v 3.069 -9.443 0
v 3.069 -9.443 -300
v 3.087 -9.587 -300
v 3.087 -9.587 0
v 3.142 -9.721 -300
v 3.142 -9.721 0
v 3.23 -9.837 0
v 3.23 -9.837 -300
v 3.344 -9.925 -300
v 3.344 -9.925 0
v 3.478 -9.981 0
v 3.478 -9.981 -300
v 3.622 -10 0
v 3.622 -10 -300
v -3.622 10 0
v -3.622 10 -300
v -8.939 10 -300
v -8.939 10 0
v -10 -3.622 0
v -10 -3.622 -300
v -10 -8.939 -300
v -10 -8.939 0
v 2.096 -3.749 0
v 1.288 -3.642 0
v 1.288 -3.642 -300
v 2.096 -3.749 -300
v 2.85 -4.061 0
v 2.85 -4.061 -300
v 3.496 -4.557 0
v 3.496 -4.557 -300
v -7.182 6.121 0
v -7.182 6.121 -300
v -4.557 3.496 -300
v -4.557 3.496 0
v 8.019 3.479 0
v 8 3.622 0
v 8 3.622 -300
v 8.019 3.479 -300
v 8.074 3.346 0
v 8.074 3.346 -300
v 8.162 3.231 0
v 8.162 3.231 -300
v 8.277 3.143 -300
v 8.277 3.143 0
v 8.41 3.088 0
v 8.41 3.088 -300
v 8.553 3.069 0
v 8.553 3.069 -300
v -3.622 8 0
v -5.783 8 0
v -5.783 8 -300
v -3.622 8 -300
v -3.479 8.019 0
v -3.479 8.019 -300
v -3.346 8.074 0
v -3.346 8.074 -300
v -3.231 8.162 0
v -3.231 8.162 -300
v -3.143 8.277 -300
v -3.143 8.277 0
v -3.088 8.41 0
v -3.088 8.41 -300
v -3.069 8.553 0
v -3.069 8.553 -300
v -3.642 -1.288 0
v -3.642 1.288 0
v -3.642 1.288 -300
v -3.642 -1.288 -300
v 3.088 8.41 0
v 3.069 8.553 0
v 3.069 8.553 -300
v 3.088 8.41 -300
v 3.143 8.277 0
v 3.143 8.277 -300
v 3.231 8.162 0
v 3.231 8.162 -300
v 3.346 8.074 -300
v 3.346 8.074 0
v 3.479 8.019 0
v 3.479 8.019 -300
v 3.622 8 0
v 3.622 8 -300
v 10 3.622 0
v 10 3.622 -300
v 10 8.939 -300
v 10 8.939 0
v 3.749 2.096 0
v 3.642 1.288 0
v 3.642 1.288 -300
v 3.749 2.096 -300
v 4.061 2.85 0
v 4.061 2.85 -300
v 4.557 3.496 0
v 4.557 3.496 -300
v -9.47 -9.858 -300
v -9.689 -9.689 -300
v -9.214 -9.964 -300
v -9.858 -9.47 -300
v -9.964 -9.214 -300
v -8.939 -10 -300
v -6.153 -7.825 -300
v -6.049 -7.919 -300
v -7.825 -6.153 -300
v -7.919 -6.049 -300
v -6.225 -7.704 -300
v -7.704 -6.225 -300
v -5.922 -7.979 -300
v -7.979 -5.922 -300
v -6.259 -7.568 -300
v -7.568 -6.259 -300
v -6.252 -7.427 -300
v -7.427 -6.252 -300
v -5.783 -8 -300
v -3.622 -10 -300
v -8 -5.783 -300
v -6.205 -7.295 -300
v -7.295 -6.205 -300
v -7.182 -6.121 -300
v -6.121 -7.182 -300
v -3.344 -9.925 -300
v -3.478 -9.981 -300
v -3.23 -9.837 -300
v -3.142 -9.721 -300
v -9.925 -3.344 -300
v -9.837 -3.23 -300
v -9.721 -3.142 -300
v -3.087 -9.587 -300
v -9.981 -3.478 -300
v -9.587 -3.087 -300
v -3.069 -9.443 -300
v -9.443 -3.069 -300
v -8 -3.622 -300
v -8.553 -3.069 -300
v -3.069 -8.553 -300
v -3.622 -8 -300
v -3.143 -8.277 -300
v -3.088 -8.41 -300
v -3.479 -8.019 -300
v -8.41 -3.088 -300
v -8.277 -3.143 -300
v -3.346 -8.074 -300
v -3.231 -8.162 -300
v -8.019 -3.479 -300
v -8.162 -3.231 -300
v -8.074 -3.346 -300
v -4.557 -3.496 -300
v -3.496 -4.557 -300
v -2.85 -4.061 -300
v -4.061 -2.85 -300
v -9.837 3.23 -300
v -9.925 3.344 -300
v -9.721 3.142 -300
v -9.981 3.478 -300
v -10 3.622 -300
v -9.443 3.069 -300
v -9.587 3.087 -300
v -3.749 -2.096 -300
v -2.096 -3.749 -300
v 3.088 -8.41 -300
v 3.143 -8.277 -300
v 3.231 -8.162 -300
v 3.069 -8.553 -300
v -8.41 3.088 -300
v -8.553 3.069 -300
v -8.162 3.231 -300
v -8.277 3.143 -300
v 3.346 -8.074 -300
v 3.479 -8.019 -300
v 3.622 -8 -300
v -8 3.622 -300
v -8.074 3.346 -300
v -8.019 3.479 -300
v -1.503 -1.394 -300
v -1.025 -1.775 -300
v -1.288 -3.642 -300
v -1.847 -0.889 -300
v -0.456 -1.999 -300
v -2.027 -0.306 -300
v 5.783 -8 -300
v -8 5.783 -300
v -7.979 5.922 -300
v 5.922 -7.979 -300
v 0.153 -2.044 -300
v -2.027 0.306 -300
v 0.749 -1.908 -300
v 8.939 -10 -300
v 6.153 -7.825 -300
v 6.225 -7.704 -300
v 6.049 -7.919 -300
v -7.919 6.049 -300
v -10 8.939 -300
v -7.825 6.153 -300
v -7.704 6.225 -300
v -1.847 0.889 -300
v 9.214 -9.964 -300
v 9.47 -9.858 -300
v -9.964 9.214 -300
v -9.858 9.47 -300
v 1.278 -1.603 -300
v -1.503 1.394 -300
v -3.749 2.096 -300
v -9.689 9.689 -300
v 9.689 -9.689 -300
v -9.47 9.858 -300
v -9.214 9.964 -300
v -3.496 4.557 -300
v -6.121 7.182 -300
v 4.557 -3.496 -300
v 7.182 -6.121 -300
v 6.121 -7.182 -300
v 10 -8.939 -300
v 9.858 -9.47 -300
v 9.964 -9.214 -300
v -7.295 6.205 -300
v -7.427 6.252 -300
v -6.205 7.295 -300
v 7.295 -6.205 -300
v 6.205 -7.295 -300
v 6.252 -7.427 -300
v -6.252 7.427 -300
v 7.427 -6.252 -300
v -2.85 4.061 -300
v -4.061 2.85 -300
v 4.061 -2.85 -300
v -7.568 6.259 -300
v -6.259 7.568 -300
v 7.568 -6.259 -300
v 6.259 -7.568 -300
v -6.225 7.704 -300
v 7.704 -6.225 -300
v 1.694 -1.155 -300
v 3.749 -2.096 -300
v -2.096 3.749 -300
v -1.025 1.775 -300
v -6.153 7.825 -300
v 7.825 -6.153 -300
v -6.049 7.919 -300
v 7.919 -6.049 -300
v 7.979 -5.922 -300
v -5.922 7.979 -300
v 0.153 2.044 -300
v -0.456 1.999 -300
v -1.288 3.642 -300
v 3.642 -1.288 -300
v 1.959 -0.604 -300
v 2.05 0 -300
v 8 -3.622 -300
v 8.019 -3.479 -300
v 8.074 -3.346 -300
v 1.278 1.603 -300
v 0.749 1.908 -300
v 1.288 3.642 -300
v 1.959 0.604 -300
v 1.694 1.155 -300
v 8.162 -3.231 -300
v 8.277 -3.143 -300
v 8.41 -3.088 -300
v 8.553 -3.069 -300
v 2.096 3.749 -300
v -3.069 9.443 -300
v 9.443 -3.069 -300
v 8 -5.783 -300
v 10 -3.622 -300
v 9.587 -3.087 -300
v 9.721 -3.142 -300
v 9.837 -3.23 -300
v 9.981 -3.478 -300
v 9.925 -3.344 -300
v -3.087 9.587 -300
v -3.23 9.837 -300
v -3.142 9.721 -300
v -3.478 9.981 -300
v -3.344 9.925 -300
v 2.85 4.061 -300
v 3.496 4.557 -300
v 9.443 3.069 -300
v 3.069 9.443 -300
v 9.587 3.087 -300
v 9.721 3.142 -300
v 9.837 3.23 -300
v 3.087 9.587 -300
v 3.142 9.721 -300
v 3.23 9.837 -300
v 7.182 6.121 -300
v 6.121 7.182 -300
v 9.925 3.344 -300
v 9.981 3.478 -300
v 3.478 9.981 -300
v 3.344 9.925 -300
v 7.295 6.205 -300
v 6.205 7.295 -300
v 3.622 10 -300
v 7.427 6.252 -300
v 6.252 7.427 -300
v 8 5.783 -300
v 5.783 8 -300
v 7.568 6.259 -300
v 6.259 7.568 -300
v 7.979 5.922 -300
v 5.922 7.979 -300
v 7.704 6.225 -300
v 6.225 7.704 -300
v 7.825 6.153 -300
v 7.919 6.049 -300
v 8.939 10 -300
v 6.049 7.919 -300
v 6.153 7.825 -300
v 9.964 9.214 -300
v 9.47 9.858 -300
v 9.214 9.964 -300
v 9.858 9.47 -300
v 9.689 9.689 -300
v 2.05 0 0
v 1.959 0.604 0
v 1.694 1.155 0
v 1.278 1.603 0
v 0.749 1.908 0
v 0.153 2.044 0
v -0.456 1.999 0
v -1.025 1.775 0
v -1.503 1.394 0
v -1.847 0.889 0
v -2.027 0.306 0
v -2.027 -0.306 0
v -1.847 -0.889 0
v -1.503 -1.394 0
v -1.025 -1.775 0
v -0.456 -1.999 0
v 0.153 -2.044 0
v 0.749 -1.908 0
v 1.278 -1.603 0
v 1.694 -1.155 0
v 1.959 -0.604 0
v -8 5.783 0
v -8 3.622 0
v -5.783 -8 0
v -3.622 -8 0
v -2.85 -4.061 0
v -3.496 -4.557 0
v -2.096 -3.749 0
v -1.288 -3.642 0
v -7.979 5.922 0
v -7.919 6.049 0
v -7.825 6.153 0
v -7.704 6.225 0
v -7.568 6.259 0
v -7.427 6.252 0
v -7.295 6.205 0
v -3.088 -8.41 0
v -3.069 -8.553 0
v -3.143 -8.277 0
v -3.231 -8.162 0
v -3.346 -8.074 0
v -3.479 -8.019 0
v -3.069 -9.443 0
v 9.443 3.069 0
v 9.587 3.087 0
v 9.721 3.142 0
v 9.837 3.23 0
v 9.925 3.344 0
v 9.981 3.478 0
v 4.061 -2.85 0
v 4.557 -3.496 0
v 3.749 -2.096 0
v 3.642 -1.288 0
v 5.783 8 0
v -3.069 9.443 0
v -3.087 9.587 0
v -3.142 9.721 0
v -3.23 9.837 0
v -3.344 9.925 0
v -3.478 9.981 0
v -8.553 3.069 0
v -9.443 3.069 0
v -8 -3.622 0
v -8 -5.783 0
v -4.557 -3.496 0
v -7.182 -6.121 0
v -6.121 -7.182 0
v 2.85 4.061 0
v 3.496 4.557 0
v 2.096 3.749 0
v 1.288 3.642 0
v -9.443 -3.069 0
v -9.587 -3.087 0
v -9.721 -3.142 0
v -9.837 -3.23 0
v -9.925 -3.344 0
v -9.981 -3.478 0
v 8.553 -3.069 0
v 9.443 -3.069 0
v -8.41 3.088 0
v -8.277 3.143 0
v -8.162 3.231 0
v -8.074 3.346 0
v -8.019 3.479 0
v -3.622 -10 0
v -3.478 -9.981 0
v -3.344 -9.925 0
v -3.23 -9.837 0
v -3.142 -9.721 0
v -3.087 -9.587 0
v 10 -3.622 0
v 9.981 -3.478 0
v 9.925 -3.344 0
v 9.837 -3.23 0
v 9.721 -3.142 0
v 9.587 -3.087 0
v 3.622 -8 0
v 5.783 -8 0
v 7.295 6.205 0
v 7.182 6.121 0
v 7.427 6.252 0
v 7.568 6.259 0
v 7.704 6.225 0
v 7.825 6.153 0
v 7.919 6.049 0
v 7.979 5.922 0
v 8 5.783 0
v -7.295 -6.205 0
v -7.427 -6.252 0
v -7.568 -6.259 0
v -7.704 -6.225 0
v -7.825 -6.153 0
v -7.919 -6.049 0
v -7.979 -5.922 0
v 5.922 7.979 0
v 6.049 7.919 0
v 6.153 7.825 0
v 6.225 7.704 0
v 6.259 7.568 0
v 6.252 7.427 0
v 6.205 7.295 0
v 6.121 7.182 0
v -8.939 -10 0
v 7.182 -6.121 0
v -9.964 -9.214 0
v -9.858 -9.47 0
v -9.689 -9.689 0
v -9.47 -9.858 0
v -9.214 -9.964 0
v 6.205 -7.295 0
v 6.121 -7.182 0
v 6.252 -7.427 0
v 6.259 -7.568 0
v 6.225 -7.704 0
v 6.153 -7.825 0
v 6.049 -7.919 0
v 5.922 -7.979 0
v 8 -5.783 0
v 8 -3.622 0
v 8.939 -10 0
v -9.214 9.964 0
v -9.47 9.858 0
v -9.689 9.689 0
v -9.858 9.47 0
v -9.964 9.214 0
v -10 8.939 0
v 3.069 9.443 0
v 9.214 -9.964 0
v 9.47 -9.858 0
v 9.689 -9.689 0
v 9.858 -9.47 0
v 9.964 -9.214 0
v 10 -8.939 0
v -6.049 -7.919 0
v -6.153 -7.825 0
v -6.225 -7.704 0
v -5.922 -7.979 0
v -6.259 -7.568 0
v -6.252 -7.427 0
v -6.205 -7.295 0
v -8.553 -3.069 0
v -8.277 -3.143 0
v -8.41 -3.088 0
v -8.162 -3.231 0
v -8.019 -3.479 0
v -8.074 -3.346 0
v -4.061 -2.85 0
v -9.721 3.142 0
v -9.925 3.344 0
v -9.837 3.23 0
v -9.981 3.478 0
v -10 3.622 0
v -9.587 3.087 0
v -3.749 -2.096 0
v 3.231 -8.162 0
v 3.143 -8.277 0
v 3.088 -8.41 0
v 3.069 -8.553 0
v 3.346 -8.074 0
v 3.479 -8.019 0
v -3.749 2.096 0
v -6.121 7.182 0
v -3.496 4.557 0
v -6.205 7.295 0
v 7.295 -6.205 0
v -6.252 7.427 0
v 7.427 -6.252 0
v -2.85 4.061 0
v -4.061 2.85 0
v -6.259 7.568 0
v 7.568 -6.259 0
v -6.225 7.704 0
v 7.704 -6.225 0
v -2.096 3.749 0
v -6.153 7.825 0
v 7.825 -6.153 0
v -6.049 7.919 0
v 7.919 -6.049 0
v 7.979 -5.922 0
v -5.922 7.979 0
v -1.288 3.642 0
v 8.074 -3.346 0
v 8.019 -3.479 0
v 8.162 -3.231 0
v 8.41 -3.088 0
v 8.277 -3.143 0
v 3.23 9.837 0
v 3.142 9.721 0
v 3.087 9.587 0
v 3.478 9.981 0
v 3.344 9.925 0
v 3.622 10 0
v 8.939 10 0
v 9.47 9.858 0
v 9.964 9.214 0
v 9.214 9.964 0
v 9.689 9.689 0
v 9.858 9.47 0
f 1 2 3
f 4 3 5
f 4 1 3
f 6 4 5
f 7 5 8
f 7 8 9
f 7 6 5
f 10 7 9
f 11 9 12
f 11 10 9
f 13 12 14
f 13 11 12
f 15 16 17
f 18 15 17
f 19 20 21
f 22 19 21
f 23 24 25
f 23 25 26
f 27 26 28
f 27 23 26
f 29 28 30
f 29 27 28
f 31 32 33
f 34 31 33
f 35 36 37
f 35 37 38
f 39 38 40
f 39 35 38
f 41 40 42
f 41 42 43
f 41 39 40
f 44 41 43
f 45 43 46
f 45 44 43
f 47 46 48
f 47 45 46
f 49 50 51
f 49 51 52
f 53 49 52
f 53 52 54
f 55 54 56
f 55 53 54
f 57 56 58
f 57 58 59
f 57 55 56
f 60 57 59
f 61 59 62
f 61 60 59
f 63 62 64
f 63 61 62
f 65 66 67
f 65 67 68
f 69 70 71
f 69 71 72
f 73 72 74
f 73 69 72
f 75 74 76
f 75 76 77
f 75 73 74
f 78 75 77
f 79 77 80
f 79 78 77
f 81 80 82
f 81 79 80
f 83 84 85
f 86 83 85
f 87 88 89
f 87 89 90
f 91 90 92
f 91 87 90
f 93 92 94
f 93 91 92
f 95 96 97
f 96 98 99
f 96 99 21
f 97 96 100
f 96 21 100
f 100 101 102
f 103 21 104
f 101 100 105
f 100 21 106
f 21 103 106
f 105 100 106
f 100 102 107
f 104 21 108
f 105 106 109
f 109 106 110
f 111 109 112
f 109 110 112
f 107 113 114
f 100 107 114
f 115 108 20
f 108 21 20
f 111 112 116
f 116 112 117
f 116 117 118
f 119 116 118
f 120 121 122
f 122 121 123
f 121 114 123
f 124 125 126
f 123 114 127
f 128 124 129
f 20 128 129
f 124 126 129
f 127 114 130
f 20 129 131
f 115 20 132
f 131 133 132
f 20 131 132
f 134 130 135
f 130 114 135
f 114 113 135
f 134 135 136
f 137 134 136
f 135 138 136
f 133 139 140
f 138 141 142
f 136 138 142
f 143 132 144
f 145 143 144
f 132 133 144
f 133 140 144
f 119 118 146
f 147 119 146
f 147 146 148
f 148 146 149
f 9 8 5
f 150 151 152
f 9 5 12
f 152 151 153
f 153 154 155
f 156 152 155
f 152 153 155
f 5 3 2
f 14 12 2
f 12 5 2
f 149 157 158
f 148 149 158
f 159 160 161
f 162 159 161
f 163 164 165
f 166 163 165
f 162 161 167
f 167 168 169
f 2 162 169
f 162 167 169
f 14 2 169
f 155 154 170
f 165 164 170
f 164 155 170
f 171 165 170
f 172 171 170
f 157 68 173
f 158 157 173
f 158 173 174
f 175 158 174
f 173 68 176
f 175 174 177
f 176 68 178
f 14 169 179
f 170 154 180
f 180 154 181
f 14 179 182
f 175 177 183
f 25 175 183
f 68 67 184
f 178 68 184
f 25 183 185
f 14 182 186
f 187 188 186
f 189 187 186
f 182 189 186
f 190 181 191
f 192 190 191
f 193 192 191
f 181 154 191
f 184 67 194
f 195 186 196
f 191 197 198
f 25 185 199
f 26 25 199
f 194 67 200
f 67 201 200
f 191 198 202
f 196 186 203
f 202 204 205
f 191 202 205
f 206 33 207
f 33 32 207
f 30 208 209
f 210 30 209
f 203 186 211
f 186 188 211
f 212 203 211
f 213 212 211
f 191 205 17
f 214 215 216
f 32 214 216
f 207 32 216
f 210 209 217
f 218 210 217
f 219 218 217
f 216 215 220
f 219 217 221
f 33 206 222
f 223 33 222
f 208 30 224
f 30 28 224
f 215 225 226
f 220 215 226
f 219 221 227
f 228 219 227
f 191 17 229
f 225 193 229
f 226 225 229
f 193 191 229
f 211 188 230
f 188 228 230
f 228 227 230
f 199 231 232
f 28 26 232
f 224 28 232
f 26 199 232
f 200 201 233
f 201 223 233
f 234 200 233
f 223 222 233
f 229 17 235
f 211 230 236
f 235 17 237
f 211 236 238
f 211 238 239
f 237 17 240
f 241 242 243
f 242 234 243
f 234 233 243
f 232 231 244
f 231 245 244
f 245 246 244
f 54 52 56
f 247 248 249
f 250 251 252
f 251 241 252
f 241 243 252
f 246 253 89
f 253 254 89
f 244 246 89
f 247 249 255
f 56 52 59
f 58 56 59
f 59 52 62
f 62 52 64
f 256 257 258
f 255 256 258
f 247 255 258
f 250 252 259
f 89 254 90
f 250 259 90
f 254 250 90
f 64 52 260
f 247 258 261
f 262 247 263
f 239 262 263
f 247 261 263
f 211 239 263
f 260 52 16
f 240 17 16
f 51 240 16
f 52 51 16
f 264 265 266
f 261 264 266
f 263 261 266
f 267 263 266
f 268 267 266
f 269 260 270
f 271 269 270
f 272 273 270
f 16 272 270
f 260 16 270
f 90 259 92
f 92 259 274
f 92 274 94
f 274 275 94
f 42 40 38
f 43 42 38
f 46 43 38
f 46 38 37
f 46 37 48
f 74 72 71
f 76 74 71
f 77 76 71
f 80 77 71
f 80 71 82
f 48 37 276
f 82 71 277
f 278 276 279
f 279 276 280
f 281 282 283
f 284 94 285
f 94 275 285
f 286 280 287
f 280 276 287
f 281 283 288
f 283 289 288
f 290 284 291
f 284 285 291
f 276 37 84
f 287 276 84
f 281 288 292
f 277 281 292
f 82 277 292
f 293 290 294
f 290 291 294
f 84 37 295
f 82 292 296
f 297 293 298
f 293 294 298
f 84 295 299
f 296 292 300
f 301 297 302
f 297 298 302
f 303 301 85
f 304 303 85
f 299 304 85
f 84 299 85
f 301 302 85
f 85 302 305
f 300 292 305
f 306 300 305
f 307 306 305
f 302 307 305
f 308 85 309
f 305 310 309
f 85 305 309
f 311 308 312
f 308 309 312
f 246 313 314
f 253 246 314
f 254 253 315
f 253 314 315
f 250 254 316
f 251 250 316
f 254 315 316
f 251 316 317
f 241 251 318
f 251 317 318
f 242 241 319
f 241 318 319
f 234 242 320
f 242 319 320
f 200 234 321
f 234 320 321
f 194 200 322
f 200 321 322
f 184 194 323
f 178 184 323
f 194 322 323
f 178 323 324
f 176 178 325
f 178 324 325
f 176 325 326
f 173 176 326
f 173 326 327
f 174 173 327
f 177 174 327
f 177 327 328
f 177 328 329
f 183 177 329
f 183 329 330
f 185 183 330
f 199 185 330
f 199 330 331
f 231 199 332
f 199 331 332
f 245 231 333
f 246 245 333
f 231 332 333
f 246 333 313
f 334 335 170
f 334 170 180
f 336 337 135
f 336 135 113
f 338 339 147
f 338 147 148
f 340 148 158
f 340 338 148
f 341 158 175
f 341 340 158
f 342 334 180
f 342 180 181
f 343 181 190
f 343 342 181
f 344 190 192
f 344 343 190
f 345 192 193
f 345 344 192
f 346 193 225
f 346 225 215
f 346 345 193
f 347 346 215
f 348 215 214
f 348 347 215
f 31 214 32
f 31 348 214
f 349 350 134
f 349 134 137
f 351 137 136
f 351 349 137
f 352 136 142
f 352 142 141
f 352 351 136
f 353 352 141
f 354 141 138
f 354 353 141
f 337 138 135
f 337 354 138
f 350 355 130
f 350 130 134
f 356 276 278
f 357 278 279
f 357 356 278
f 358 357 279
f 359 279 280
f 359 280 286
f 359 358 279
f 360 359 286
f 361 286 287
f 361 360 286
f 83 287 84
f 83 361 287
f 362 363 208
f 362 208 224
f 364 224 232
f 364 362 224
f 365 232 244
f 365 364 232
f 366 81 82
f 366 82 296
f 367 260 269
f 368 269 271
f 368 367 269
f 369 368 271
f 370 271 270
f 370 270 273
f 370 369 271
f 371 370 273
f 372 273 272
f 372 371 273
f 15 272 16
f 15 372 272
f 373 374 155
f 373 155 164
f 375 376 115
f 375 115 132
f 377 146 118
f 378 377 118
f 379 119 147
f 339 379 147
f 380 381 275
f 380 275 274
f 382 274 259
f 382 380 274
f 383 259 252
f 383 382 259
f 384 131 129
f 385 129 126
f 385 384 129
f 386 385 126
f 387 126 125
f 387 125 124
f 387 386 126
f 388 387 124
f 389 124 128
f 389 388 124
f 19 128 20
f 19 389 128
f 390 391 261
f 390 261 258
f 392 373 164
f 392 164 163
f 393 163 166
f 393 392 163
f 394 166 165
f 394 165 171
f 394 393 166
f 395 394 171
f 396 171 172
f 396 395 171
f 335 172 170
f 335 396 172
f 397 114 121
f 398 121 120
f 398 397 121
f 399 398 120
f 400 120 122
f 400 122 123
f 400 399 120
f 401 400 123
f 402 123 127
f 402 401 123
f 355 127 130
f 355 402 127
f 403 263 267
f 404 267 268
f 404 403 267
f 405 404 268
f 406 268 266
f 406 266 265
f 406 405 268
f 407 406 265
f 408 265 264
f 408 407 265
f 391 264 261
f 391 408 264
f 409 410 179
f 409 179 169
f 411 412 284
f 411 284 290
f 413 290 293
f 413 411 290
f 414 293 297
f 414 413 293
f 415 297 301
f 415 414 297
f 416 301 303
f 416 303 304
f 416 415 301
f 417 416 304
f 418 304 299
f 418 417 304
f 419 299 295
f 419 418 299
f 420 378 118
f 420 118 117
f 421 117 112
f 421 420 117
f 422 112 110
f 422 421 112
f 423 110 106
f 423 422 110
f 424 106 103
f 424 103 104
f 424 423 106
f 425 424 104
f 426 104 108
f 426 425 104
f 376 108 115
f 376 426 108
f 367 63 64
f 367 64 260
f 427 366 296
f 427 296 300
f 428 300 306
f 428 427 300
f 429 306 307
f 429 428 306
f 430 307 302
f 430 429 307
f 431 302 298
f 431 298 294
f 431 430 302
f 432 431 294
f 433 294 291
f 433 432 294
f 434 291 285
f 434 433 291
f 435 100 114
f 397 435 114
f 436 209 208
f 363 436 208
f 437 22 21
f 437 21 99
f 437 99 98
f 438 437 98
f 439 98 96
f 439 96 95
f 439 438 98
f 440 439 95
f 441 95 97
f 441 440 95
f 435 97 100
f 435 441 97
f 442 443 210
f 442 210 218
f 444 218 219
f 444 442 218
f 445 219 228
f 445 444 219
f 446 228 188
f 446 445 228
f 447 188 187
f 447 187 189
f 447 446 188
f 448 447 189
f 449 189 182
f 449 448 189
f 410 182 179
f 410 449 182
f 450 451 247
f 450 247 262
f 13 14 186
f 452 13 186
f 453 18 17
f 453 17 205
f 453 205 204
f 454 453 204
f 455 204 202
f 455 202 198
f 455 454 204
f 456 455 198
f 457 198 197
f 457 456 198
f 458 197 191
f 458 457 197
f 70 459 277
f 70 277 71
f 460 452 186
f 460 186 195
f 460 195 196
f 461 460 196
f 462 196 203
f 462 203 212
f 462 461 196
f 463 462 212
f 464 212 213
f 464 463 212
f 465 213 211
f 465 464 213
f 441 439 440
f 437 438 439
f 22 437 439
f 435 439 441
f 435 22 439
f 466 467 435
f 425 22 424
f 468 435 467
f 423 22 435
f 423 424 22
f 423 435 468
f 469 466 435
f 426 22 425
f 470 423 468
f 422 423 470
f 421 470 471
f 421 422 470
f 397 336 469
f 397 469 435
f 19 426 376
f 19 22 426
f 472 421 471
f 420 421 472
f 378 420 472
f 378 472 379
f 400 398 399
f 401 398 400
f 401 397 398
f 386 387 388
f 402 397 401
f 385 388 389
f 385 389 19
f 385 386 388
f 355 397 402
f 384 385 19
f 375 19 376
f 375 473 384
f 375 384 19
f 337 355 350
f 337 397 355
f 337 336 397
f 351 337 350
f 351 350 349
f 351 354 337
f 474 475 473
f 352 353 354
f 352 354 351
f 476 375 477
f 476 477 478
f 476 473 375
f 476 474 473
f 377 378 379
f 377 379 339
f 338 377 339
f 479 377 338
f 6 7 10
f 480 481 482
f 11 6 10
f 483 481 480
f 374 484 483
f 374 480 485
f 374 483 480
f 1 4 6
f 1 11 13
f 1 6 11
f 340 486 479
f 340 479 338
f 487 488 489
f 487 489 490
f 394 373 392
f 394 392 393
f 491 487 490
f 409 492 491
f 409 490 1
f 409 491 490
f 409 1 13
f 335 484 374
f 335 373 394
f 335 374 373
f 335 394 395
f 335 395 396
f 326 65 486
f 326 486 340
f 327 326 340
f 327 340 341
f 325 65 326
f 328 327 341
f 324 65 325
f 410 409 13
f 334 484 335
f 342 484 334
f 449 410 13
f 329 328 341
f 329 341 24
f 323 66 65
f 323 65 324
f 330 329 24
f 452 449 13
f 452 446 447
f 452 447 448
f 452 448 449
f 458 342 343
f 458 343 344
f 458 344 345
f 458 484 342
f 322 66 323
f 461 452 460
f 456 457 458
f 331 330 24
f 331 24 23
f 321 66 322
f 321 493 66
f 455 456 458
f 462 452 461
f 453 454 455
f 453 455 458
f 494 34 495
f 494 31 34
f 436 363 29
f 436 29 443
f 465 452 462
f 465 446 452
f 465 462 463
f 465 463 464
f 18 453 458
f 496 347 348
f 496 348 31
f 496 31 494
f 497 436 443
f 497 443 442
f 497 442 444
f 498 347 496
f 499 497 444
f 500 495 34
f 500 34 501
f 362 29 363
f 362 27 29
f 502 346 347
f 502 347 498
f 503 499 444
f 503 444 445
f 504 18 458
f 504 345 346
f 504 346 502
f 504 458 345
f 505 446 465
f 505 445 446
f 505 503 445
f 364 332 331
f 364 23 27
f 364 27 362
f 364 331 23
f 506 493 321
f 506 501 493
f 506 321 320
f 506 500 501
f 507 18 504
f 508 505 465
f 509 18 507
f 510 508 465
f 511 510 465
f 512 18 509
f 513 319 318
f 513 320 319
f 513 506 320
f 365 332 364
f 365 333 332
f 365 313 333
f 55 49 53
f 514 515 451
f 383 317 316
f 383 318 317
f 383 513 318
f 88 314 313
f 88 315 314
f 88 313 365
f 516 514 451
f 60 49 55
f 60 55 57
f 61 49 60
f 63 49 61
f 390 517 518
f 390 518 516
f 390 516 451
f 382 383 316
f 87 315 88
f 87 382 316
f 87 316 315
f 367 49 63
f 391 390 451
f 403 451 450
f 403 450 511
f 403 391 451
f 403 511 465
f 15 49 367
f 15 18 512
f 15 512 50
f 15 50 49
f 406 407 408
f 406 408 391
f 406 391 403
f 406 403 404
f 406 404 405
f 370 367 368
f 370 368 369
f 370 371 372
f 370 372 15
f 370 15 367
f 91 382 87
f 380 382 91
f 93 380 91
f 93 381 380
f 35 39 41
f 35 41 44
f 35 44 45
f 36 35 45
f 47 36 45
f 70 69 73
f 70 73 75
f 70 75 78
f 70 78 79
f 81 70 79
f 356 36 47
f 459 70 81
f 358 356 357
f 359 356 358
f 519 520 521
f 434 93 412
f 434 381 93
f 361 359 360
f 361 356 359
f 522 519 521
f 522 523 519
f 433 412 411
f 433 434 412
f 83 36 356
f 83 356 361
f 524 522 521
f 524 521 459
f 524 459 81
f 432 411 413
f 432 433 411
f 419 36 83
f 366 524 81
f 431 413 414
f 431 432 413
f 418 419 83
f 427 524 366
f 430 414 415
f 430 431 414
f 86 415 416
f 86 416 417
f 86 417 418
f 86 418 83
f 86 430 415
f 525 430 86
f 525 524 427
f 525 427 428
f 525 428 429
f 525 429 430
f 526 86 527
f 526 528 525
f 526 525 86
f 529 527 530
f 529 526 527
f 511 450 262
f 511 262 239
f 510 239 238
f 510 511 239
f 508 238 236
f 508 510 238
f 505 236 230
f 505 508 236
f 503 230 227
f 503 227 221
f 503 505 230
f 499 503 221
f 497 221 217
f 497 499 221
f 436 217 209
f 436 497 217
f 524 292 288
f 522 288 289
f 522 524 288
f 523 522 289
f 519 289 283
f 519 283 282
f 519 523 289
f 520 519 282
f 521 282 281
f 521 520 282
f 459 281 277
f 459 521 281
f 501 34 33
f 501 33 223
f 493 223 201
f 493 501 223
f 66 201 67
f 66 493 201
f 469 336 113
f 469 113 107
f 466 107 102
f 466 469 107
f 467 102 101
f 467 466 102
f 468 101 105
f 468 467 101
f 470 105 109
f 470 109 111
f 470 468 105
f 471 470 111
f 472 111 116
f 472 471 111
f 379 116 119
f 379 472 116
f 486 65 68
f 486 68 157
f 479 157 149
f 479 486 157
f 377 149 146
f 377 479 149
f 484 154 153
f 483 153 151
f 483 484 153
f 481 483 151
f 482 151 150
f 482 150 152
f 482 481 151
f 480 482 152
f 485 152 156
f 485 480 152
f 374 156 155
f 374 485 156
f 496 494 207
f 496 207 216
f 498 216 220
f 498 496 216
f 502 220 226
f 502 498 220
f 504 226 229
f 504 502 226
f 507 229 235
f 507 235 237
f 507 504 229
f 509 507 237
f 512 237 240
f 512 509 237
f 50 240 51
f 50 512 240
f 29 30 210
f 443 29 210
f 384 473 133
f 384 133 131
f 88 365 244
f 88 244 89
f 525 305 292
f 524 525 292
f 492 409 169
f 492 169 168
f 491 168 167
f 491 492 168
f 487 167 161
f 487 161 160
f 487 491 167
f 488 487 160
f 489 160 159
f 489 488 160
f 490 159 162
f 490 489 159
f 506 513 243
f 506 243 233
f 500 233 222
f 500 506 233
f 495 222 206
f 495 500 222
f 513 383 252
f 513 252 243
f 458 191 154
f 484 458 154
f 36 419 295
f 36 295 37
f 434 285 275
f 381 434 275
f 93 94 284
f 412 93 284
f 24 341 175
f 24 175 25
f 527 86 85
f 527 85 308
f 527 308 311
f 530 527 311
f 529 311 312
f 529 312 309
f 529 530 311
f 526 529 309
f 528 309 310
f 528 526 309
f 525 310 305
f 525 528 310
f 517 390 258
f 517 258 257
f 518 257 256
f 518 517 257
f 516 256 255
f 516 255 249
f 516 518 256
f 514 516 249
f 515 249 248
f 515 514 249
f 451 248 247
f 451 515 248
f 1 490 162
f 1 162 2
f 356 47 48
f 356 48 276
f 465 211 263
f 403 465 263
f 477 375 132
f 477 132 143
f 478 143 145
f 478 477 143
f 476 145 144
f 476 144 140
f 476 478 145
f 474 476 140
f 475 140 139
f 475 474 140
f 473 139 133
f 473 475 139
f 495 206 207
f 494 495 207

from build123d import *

# Parameters (mm, degrees)
SKETCH2_R           = 2.05
BOSS_EXTRUDE1_DEPTH = 300


with BuildPart() as part:
    # Sketch2 → Boss-Extrude1 (new body)
    with BuildSketch(Plane.XY):
        with BuildLine():
            Line((-3.642230561, 1.287773026), (-3.642230561, -1.287773026))
            ThreePointArc((-3.642230561, -1.287773026), (-3.87999308, -2.483085929), (-4.55708345, -3.496423279))
            Line((-4.55708345, -3.496423279), (-7.182004606, -6.121344434))
            ThreePointArc((-7.182004606, -6.121344434), (-7.704200045, -6.225215565), (-8, -5.782519648))
            Line((-8, -5.782519648), (-8, -3.622007668))
            ThreePointArc((-8, -3.622007668), (-8.161974206, -3.230967343), (-8.553014531, -3.068993137))
            Line((-8.553014531, -3.068993137), (-9.443284204, -3.068993137))
            ThreePointArc((-9.443284204, -3.068993137), (-9.836715763, -3.229656566), (-10, -3.622007668))
            Line((-10, -3.622007668), (-10, -8.939033256))
            ThreePointArc((-10, -8.939033256), (-9.689250035, -9.689250035), (-8.939033256, -10))
            Line((-8.939033256, -10), (-3.622007668, -10))
            ThreePointArc((-3.622007668, -10), (-3.229656566, -9.836715763), (-3.068993137, -9.443284204))
            Line((-3.068993137, -9.443284204), (-3.068993137, -8.553014531))
            ThreePointArc((-3.068993137, -8.553014531), (-3.230967343, -8.161974206), (-3.622007668, -8))
            Line((-3.622007668, -8), (-5.782519648, -8))
            ThreePointArc((-5.782519648, -8), (-6.225215565, -7.704200045), (-6.121344434, -7.182004606))
            Line((-6.121344434, -7.182004606), (-3.496423279, -4.55708345))
            ThreePointArc((-3.496423279, -4.55708345), (-2.483085929, -3.87999308), (-1.287773026, -3.642230561))
            Line((-1.287773026, -3.642230561), (1.287773026, -3.642230561))
            ThreePointArc((1.287773026, -3.642230561), (2.483085929, -3.87999308), (3.496423279, -4.55708345))
            Line((3.496423279, -4.55708345), (6.121344434, -7.182004606))
            ThreePointArc((6.121344434, -7.182004606), (6.225215565, -7.704200045), (5.782519648, -8))
            Line((5.782519648, -8), (3.622007668, -8))
            ThreePointArc((3.622007668, -8), (3.230967343, -8.161974206), (3.068993137, -8.553014531))
            Line((3.068993137, -8.553014531), (3.068993137, -9.443284204))
            ThreePointArc((3.068993137, -9.443284204), (3.229656566, -9.836715763), (3.622007668, -10))
            Line((3.622007668, -10), (8.939033256, -10))
            ThreePointArc((8.939033256, -10), (9.689250035, -9.689250035), (10, -8.939033256))
            Line((10, -8.939033256), (10, -3.622007668))
            ThreePointArc((10, -3.622007668), (9.836715763, -3.229656566), (9.443284204, -3.068993137))
            Line((9.443284204, -3.068993137), (8.553014531, -3.068993137))
            ThreePointArc((8.553014531, -3.068993137), (8.161974206, -3.230967343), (8, -3.622007668))
            Line((8, -3.622007668), (8, -5.782519648))
            ThreePointArc((8, -5.782519648), (7.704200045, -6.225215565), (7.182004606, -6.121344434))
            Line((7.182004606, -6.121344434), (4.55708345, -3.496423279))
            ThreePointArc((4.55708345, -3.496423279), (3.87999308, -2.483085929), (3.642230561, -1.287773026))
            Line((3.642230561, -1.287773026), (3.642230561, 1.287773026))
            ThreePointArc((3.642230561, 1.287773026), (3.87999308, 2.483085929), (4.55708345, 3.496423279))
            Line((4.55708345, 3.496423279), (7.182004606, 6.121344434))
            ThreePointArc((7.182004606, 6.121344434), (7.704200045, 6.225215565), (8, 5.782519648))
            Line((8, 5.782519648), (8, 3.622007668))
            ThreePointArc((8, 3.622007668), (8.161974206, 3.230967343), (8.553014531, 3.068993137))
            Line((8.553014531, 3.068993137), (9.443284204, 3.068993137))
            ThreePointArc((9.443284204, 3.068993137), (9.836715763, 3.229656566), (10, 3.622007668))
            Line((10, 3.622007668), (10, 8.939033256))
            ThreePointArc((10, 8.939033256), (9.689250035, 9.689250035), (8.939033256, 10))
            Line((8.939033256, 10), (3.622007668, 10))
            ThreePointArc((3.622007668, 10), (3.229656566, 9.836715763), (3.068993137, 9.443284204))
            Line((3.068993137, 9.443284204), (3.068993137, 8.553014531))
            ThreePointArc((3.068993137, 8.553014531), (3.230967343, 8.161974206), (3.622007668, 8))
            Line((3.622007668, 8), (5.782519648, 8))
            ThreePointArc((5.782519648, 8), (6.225215565, 7.704200045), (6.121344434, 7.182004606))
            Line((6.121344434, 7.182004606), (3.496423279, 4.55708345))
            ThreePointArc((3.496423279, 4.55708345), (2.483085929, 3.87999308), (1.287773026, 3.642230561))
            Line((1.287773026, 3.642230561), (-1.287773026, 3.642230561))
            ThreePointArc((-1.287773026, 3.642230561), (-2.483085929, 3.87999308), (-3.496423279, 4.55708345))
            Line((-3.496423279, 4.55708345), (-6.121344434, 7.182004606))
            ThreePointArc((-6.121344434, 7.182004606), (-6.225215565, 7.704200045), (-5.782519648, 8))
            Line((-5.782519648, 8), (-3.622007668, 8))
            ThreePointArc((-3.622007668, 8), (-3.230967343, 8.161974206), (-3.068993137, 8.553014531))
            Line((-3.068993137, 8.553014531), (-3.068993137, 9.443284204))
            ThreePointArc((-3.068993137, 9.443284204), (-3.229656566, 9.836715763), (-3.622007668, 10))
            Line((-3.622007668, 10), (-8.939033256, 10))
            ThreePointArc((-8.939033256, 10), (-9.689250035, 9.689250035), (-10, 8.939033256))
            Line((-10, 8.939033256), (-10, 3.622007668))
            ThreePointArc((-10, 3.622007668), (-9.836715763, 3.229656566), (-9.443284204, 3.068993137))
            Line((-9.443284204, 3.068993137), (-8.553014531, 3.068993137))
            ThreePointArc((-8.553014531, 3.068993137), (-8.161974206, 3.230967343), (-8, 3.622007668))
            Line((-8, 3.622007668), (-8, 5.782519648))
            ThreePointArc((-8, 5.782519648), (-7.704200045, 6.225215565), (-7.182004606, 6.121344434))
            Line((-7.182004606, 6.121344434), (-4.55708345, 3.496423279))
            ThreePointArc((-4.55708345, 3.496423279), (-3.87999308, 2.483085929), (-3.642230561, 1.287773026))
        make_face()
        Circle(SKETCH2_R, mode=Mode.SUBTRACT)
    extrude(amount=-BOSS_EXTRUDE1_DEPTH)


solid = part.part
